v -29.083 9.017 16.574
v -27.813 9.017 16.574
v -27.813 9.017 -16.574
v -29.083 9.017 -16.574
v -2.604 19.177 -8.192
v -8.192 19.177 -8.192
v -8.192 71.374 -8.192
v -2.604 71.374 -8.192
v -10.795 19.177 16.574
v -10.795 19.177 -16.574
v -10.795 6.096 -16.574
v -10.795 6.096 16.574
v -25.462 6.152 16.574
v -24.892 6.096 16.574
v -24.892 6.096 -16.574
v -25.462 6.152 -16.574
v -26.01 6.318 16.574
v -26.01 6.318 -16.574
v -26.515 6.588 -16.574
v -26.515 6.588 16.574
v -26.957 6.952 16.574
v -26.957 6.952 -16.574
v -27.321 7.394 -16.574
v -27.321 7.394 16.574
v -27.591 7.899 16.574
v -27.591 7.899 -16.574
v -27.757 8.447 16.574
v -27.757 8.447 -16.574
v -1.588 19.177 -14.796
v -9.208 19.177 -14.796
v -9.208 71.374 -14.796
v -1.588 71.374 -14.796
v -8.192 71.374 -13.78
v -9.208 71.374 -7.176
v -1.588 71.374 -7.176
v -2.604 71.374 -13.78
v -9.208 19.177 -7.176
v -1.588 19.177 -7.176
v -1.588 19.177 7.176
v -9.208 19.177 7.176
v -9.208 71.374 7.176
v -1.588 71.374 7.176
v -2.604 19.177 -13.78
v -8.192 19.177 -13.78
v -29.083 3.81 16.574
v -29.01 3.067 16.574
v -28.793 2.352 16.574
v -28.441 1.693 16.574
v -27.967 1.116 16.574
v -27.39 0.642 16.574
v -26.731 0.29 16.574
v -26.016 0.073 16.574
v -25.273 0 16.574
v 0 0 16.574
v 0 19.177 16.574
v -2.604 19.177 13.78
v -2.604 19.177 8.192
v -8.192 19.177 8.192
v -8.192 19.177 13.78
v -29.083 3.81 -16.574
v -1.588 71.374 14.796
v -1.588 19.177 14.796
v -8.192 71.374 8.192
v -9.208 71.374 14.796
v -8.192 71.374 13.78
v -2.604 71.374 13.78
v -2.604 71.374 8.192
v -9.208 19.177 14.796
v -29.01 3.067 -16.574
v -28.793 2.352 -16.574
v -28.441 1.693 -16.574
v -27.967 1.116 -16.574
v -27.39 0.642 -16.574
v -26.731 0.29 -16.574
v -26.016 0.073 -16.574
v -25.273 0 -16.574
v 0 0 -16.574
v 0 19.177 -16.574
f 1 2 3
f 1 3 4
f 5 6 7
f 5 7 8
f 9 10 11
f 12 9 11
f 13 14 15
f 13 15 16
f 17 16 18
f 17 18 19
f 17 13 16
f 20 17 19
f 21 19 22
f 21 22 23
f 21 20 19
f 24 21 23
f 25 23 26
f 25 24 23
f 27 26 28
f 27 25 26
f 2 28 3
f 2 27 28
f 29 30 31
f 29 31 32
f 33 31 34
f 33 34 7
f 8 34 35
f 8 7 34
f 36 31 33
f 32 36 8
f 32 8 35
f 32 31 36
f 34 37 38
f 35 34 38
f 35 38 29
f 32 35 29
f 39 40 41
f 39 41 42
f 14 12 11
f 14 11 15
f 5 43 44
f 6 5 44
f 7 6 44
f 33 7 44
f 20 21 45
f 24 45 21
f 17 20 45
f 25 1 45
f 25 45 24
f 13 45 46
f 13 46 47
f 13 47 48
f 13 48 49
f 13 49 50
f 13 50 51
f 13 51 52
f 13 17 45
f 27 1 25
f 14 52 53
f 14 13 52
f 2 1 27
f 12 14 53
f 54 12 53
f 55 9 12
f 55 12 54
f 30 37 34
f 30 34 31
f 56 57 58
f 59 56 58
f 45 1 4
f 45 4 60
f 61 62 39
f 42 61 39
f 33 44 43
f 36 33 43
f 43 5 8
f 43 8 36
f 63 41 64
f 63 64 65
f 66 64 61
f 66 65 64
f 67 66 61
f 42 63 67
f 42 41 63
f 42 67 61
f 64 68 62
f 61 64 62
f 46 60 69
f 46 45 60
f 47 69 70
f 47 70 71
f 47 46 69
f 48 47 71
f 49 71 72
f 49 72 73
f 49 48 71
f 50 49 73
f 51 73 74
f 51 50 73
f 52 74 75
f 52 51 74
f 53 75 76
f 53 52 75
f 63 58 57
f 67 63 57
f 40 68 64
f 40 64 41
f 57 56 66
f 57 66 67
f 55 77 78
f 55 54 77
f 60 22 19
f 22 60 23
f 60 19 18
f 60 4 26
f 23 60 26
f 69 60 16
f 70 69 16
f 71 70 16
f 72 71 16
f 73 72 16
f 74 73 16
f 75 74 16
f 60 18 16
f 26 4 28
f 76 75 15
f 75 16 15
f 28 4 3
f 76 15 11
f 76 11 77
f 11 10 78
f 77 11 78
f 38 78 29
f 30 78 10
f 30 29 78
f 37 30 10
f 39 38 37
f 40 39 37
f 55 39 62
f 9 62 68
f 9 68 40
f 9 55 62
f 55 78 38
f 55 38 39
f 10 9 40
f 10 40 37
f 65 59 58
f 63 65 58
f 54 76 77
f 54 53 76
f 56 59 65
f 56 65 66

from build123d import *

# Parameters (mm, degrees)
BOSS_EXTRUDE1_DEPTH = 16.5735
SKETCH2_W           = 7.62
SKETCH2_H           = 7.62
SKETCH2_W_2         = 5.588
SKETCH2_H_2         = 5.588
BOSS_EXTRUDE2_DEPTH = 52.197


with BuildPart() as part:
    # Sketch1 → Boss-Extrude1 (new body, symmetric)
    with BuildSketch(Plane.XY):
        with BuildLine():
            Line((0, 0), (0, 19.177))
            Line((0, 19.177), (-10.795, 19.177))
            Line((-10.795, 19.177), (-10.795, 6.096))
            Line((-10.795, 6.096), (-24.892, 6.096))
            ThreePointArc((-24.892, 6.096), (-26.957458908, 6.951541092), (-27.813, 9.017))
            Line((-27.813, 9.017), (-29.083, 9.017))
            Line((-29.083, 9.017), (-29.083, 3.81))
            ThreePointArc((-29.083, 3.81), (-27.967076836, 1.115923164), (-25.273, 0))
            Line((-25.273, 0), (0, 0))
        make_face()
    extrude(amount=BOSS_EXTRUDE1_DEPTH, both=True)

    # Sketch2 → Boss-Extrude2 (add)
    with BuildSketch(Plane(origin=(0, 19.177, 0), x_dir=(1, 0, 0), z_dir=(0, 1, 0))):
        with Locations((-5.3975, 10.9855)):
            Rectangle(SKETCH2_W, SKETCH2_H)
        with Locations((-5.3975, 10.9855)):
            Rectangle(SKETCH2_W_2, SKETCH2_H_2, mode=Mode.SUBTRACT)
        with Locations((-5.3975, -10.9855)):
            Rectangle(SKETCH2_W, SKETCH2_H)
        with Locations((-5.3975, -10.9855)):
            Rectangle(SKETCH2_W_2, SKETCH2_H_2, mode=Mode.SUBTRACT)
    extrude(amount=BOSS_EXTRUDE2_DEPTH)


solid = part.part
